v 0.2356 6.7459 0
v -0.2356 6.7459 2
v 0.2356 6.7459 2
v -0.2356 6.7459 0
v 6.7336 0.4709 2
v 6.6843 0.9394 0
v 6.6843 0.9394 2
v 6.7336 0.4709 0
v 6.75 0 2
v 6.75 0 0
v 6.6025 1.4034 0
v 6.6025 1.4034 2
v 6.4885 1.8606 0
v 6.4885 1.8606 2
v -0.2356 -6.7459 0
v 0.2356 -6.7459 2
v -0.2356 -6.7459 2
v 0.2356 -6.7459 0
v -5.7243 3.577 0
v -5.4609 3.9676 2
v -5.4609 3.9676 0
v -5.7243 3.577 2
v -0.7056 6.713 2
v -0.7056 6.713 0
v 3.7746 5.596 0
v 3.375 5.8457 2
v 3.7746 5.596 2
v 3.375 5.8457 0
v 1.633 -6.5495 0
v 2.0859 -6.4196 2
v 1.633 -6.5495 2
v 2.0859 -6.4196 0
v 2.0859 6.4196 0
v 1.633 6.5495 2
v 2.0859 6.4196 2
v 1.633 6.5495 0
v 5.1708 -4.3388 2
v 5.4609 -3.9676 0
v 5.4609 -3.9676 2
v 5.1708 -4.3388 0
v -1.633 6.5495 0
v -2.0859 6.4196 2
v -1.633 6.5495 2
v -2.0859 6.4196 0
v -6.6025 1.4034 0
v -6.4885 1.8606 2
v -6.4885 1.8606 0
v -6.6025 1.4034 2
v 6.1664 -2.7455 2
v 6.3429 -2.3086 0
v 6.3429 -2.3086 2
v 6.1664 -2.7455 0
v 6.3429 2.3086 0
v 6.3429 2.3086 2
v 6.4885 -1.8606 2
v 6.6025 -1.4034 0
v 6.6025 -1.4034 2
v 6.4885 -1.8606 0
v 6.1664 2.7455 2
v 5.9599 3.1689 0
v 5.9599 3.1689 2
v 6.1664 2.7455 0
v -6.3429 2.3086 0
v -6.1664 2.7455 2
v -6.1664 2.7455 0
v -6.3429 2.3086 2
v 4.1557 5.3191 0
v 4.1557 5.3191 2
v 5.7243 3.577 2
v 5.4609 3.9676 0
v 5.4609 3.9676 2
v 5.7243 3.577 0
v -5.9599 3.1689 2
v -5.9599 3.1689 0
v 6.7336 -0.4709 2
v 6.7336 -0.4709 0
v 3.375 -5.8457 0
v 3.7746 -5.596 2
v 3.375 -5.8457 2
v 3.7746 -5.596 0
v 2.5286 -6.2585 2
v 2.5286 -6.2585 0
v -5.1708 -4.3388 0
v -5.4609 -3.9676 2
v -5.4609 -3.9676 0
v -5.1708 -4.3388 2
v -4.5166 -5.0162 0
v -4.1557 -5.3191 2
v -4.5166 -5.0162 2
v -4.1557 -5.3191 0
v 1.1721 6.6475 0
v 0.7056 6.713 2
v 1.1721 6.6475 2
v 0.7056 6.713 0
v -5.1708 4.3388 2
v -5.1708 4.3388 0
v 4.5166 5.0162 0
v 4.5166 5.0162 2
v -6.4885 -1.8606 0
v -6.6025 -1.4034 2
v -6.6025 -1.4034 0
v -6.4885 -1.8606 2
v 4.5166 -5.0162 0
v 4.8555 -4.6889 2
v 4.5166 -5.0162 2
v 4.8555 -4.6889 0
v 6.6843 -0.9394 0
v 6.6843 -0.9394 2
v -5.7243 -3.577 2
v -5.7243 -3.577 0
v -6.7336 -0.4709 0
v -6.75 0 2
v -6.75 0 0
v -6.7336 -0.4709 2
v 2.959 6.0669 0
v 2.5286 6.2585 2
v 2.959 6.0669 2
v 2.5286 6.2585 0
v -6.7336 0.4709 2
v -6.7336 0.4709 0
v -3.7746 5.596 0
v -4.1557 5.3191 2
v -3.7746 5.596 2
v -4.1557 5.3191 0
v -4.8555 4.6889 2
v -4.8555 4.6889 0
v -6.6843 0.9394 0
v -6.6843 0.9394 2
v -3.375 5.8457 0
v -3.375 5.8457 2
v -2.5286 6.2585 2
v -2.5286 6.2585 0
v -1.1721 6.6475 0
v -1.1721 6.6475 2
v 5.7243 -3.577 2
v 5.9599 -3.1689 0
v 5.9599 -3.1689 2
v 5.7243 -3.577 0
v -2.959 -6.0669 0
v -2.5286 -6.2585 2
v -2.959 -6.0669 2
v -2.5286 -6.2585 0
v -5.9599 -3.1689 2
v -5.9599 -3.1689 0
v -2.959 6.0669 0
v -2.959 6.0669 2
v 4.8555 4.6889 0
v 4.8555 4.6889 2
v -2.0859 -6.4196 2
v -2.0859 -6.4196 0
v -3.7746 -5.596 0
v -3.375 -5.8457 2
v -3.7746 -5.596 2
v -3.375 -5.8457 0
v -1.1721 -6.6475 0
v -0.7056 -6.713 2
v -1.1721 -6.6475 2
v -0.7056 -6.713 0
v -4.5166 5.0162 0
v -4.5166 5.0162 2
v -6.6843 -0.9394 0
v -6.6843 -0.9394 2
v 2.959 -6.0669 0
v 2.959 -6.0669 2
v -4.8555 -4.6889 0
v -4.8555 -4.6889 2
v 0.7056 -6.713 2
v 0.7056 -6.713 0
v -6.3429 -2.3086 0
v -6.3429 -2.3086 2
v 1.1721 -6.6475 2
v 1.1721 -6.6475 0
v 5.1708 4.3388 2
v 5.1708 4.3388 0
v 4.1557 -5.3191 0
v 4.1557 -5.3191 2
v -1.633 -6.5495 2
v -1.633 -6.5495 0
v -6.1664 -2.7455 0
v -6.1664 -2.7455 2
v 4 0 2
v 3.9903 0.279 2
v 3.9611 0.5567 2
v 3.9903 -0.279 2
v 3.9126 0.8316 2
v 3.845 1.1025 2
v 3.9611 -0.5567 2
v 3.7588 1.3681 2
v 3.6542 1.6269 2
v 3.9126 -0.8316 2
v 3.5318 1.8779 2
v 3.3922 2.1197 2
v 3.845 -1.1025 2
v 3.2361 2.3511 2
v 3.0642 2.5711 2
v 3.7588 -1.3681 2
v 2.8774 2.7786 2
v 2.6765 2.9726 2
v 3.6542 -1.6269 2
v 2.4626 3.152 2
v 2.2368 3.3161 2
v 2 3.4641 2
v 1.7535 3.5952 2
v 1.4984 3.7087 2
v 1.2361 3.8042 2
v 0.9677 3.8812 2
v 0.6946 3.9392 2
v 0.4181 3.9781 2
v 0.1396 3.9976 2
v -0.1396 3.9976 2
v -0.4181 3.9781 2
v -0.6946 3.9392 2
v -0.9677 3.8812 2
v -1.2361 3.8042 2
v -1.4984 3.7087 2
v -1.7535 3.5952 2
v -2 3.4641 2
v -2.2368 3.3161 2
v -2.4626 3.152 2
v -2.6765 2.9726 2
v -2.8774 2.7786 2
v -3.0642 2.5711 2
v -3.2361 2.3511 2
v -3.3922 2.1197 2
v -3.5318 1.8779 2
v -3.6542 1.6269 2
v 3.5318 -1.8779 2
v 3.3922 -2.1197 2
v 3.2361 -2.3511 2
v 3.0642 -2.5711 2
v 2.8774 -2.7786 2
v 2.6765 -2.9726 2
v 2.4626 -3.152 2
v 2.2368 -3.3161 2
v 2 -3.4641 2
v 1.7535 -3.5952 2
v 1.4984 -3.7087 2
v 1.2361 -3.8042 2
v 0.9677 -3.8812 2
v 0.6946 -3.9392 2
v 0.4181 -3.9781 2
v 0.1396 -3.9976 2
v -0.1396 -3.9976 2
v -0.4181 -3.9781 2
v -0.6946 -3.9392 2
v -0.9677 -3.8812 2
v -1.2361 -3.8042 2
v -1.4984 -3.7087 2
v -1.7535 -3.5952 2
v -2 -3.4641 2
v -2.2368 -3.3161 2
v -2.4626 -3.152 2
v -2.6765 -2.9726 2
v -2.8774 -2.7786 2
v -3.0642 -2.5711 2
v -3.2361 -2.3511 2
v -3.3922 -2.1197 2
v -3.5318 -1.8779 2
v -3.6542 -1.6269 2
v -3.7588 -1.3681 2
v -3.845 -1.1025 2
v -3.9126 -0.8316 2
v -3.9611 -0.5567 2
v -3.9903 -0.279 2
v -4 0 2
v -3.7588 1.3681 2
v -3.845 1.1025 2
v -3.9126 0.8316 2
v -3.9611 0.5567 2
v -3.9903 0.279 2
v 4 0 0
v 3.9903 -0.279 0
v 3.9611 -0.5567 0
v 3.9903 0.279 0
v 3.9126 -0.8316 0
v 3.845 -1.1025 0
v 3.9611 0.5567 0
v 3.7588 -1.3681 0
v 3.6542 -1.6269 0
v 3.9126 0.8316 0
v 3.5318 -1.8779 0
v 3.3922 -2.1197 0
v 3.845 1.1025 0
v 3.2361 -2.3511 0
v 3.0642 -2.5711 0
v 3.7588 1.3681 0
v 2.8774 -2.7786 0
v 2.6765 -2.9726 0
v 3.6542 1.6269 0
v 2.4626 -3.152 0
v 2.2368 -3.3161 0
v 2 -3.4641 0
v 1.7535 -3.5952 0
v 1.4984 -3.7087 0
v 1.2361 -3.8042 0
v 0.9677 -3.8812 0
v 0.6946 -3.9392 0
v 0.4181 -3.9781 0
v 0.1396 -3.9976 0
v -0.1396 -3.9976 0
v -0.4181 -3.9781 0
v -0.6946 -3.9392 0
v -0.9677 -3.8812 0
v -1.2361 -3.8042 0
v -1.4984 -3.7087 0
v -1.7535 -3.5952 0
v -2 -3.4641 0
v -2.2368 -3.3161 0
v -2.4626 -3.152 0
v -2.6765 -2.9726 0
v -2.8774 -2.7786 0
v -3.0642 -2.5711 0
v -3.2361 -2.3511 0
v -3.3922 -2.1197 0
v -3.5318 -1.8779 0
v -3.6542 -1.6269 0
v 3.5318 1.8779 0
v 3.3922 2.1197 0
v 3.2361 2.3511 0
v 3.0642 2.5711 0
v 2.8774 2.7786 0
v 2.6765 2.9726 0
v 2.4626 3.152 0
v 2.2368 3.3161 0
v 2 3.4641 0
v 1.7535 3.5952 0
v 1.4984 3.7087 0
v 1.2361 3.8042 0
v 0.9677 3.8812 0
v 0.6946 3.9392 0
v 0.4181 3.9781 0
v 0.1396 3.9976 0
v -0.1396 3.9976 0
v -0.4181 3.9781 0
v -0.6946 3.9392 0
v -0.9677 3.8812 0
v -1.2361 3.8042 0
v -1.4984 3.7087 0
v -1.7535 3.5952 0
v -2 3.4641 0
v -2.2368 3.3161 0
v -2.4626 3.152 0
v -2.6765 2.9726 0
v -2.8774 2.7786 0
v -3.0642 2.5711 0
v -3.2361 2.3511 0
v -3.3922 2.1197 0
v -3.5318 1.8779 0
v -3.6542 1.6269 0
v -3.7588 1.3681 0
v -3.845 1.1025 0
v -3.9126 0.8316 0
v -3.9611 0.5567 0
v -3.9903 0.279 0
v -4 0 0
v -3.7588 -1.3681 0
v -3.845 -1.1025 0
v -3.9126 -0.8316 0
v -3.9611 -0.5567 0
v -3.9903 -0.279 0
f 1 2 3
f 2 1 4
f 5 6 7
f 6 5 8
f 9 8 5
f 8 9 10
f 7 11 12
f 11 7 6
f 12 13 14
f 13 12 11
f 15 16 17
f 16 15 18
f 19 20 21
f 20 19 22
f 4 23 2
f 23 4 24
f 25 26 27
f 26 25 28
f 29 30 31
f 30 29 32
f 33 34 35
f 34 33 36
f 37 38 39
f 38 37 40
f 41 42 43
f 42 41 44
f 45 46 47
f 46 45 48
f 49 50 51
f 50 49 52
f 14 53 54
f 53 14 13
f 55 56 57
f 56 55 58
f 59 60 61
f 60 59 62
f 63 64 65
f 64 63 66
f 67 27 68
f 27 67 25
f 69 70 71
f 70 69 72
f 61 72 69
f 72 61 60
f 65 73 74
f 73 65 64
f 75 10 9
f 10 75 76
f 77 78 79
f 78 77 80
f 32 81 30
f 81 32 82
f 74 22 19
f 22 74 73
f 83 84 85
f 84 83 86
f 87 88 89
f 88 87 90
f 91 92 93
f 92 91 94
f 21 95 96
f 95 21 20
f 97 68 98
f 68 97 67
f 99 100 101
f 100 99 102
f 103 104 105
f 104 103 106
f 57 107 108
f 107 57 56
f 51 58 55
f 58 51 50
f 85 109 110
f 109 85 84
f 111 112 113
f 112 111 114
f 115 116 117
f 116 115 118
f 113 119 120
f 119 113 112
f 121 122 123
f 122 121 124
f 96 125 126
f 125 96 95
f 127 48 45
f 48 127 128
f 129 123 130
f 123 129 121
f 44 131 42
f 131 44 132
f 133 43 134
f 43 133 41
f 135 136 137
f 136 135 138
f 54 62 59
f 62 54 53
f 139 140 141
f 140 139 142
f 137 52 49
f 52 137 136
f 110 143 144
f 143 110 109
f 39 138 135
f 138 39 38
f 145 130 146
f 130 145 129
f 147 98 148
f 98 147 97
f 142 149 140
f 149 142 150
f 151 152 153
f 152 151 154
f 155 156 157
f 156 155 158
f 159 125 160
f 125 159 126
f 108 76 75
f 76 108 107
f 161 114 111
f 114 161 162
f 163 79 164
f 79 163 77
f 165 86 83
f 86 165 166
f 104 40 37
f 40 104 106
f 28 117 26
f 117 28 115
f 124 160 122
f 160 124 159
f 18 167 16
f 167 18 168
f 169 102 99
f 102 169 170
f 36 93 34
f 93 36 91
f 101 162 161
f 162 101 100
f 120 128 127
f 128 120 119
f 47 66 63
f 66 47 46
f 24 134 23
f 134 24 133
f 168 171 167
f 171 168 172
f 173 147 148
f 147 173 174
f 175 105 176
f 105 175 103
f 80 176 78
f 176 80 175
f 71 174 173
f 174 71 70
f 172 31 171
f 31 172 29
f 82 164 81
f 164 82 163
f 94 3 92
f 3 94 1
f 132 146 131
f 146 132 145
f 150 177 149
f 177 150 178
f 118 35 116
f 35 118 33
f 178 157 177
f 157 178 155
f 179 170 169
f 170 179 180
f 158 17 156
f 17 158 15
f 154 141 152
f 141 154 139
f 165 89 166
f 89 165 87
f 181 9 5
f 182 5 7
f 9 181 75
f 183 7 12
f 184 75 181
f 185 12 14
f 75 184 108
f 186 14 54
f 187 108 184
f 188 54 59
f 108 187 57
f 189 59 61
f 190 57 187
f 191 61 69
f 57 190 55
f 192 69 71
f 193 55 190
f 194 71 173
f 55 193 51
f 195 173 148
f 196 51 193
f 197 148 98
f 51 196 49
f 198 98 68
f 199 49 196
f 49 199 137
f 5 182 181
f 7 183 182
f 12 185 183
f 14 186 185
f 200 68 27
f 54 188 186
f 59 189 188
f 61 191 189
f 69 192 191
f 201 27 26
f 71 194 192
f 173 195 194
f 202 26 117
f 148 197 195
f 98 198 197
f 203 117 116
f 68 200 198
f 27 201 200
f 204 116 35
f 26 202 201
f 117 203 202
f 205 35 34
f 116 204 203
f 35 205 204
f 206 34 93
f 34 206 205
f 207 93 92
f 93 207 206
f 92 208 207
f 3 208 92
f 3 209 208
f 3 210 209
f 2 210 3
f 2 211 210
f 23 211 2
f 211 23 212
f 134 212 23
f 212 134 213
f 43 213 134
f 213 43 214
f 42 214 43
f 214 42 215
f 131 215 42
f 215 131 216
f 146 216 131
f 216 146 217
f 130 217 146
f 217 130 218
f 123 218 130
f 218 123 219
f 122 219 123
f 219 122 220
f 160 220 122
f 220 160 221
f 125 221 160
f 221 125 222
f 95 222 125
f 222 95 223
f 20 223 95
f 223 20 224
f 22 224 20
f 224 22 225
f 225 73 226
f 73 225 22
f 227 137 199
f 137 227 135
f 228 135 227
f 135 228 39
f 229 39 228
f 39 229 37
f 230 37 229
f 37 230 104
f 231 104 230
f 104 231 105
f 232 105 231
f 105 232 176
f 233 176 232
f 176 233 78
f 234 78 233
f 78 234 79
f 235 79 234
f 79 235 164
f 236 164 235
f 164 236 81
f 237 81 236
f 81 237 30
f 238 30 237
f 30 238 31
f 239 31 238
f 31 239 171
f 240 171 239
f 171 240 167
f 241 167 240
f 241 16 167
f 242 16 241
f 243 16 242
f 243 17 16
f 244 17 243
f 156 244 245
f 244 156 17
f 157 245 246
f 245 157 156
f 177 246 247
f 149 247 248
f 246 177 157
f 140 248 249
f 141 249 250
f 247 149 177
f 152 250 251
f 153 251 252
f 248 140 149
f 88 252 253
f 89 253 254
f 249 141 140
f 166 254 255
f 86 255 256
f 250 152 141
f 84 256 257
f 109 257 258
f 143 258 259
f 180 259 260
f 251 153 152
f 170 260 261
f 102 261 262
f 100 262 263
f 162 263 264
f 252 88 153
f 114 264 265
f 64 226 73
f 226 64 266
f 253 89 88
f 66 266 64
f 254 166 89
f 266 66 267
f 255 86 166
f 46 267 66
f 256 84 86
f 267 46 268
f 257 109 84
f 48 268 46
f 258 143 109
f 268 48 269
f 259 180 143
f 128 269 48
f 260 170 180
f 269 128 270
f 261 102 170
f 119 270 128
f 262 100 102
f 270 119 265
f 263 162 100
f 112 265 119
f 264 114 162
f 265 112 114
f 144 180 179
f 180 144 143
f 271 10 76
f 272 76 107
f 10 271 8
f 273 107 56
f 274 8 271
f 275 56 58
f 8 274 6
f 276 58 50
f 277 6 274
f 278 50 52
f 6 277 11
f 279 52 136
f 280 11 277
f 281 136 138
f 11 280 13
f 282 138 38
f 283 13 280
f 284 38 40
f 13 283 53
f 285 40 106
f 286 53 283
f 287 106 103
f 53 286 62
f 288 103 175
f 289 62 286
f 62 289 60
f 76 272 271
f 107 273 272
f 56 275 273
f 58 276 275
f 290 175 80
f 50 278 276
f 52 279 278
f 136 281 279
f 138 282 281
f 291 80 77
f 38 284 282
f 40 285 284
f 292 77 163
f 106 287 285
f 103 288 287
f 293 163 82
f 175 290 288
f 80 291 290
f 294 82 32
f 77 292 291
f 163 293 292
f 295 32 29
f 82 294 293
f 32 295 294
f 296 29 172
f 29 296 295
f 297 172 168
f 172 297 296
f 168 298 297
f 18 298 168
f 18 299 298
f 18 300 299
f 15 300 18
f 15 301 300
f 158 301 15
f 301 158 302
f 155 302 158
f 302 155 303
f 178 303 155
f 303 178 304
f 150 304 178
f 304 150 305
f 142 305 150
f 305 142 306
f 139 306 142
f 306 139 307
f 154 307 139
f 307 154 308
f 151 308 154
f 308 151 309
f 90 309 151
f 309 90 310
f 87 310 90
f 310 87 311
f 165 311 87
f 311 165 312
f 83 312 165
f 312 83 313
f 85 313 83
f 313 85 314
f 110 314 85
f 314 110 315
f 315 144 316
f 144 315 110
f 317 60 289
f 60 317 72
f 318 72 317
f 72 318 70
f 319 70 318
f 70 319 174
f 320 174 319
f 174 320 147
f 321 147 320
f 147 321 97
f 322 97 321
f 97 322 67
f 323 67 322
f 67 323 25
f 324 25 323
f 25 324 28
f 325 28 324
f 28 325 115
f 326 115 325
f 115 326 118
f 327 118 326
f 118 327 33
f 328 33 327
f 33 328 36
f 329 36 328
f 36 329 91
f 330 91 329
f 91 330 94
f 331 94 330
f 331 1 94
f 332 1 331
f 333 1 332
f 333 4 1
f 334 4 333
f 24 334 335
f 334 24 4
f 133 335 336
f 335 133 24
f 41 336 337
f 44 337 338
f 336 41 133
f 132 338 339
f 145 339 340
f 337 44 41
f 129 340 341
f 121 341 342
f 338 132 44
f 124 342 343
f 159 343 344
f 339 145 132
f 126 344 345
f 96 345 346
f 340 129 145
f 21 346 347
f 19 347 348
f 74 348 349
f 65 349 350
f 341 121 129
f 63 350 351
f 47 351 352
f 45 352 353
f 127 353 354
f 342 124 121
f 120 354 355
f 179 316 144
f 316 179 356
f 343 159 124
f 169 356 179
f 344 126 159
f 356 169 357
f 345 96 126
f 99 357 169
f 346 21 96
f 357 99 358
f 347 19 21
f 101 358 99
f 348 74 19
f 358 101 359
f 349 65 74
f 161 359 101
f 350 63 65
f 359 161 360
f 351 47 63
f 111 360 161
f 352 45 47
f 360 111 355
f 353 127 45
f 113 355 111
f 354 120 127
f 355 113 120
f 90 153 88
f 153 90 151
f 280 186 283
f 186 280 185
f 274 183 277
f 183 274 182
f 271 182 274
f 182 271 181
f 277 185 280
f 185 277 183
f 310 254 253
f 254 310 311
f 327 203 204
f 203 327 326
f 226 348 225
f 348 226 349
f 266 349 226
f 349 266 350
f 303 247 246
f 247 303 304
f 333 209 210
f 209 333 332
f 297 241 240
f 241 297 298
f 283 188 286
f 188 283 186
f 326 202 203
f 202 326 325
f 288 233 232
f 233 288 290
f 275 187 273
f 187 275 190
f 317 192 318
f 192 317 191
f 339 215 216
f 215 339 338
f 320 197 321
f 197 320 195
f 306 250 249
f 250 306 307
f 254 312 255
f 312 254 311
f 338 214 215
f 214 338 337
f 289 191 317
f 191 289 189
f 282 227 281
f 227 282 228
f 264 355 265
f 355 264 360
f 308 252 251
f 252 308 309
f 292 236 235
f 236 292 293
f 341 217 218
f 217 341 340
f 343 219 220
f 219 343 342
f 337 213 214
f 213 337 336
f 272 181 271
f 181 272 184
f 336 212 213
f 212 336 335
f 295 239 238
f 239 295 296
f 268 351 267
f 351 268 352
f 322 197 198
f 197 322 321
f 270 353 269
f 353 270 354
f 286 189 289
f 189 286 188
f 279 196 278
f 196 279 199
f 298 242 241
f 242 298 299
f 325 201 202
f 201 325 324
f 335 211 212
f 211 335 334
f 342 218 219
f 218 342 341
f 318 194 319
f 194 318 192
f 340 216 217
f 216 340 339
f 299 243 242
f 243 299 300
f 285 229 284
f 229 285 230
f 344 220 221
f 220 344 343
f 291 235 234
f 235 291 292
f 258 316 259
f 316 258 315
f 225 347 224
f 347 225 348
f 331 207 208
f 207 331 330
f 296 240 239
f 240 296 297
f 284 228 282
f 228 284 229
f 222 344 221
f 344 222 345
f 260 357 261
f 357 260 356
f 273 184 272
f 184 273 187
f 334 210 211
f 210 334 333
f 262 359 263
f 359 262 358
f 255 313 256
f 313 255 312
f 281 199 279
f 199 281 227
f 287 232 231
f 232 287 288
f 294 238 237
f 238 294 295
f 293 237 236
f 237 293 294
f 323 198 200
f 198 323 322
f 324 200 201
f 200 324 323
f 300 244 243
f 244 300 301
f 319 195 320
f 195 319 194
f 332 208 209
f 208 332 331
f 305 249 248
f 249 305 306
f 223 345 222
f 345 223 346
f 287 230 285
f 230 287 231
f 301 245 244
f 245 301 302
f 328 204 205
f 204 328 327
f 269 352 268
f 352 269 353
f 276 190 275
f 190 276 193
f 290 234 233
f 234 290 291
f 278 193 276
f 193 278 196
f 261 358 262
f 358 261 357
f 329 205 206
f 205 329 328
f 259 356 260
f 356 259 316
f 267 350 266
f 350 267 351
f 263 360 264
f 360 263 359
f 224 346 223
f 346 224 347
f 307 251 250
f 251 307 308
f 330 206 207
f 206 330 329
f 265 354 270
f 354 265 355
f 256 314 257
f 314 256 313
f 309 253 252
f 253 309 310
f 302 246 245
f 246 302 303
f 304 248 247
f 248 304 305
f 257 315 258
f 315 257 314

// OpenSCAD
$fn=90;

// top
difference() {
    cylinder(d=13.5, h=2);
    cylinder(d=8, h=2);
}
